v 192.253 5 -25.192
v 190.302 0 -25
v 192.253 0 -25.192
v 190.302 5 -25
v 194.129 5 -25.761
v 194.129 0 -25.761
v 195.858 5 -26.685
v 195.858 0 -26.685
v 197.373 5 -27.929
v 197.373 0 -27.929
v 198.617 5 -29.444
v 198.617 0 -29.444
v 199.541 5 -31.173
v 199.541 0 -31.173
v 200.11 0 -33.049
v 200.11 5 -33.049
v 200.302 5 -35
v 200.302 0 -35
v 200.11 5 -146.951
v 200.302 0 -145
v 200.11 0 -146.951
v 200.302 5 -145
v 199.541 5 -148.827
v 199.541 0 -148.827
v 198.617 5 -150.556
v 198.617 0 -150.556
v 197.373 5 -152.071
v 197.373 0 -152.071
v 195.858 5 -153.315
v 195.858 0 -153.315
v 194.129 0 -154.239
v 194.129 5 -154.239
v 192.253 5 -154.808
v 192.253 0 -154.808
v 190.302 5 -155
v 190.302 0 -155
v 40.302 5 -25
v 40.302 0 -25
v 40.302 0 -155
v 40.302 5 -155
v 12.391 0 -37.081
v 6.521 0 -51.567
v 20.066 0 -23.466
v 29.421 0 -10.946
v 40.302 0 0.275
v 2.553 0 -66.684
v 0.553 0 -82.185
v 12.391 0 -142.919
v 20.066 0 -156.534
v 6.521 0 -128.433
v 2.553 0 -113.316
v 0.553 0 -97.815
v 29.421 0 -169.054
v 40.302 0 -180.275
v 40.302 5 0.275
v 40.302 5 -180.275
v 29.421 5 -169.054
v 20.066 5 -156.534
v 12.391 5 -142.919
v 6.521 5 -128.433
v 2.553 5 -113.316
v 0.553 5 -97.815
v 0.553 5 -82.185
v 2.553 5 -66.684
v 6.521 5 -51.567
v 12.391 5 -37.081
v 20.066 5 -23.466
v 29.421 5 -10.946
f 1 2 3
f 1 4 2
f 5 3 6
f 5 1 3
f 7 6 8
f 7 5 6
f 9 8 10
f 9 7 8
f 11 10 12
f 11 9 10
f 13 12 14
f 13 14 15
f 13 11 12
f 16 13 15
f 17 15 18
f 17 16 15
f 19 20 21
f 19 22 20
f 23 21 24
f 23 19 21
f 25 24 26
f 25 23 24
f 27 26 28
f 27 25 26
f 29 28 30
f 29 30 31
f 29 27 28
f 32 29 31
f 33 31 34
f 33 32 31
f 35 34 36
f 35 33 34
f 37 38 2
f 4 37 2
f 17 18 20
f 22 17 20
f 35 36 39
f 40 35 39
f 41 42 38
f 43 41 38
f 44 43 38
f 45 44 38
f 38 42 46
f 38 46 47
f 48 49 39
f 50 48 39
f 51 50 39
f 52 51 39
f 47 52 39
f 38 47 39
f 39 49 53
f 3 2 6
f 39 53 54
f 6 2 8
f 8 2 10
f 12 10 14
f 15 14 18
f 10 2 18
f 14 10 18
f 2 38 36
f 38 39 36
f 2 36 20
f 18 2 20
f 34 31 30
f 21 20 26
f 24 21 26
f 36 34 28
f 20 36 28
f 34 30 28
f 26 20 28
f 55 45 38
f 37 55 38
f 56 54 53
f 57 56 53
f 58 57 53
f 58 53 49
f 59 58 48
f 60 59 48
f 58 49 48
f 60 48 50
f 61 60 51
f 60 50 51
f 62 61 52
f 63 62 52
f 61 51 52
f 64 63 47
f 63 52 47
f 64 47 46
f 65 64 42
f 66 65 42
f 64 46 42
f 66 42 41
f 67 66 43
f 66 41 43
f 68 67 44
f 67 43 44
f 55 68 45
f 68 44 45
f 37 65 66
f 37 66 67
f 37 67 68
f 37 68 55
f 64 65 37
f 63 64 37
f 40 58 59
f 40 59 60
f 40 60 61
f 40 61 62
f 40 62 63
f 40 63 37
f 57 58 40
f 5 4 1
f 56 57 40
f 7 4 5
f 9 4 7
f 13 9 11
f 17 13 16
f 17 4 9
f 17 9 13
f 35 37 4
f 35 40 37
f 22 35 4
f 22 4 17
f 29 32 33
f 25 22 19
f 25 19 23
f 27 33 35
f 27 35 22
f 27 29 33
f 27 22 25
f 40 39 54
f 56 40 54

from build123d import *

# Parameters (mm, degrees)
BOSS_EXTRUDE1_DEPTH = 5
FILLET1_R           = 10


with BuildPart() as part:
    # Sketch1 → Boss-Extrude1 (new body)
    with BuildSketch(Plane(origin=(0, 0, 0), x_dir=(1, 0, 0), z_dir=(0, 1, 0))):
        with BuildLine():
            Line((40.301843205, 25), (110.301843205, 25))
            Line((110.301843205, 25), (200.301843205, 25))
            Line((200.301843205, 25), (200.301843205, 155))
            Line((200.301843205, 155), (110.301843205, 155))
            Line((110.301843205, 155), (40.301843205, 155))
            Line((40.301843205, 155), (40.301843205, 180.27466017))
            ThreePointArc((40.301843205, 180.27466017), (0.301843205, 90), (40.301843205, -0.27466017))
            Line((40.301843205, -0.27466017), (40.301843205, 25))
        make_face()
    extrude(amount=BOSS_EXTRUDE1_DEPTH)

    # Fillet1
    fillet1_edges = [part.edges().sort_by_distance(p)[0] for p in [
        (200.301843205, 2.5, -155),
        (200.301843205, 2.5, -25),
    ]]
    fillet(fillet1_edges, radius=FILLET1_R)


solid = part.part
